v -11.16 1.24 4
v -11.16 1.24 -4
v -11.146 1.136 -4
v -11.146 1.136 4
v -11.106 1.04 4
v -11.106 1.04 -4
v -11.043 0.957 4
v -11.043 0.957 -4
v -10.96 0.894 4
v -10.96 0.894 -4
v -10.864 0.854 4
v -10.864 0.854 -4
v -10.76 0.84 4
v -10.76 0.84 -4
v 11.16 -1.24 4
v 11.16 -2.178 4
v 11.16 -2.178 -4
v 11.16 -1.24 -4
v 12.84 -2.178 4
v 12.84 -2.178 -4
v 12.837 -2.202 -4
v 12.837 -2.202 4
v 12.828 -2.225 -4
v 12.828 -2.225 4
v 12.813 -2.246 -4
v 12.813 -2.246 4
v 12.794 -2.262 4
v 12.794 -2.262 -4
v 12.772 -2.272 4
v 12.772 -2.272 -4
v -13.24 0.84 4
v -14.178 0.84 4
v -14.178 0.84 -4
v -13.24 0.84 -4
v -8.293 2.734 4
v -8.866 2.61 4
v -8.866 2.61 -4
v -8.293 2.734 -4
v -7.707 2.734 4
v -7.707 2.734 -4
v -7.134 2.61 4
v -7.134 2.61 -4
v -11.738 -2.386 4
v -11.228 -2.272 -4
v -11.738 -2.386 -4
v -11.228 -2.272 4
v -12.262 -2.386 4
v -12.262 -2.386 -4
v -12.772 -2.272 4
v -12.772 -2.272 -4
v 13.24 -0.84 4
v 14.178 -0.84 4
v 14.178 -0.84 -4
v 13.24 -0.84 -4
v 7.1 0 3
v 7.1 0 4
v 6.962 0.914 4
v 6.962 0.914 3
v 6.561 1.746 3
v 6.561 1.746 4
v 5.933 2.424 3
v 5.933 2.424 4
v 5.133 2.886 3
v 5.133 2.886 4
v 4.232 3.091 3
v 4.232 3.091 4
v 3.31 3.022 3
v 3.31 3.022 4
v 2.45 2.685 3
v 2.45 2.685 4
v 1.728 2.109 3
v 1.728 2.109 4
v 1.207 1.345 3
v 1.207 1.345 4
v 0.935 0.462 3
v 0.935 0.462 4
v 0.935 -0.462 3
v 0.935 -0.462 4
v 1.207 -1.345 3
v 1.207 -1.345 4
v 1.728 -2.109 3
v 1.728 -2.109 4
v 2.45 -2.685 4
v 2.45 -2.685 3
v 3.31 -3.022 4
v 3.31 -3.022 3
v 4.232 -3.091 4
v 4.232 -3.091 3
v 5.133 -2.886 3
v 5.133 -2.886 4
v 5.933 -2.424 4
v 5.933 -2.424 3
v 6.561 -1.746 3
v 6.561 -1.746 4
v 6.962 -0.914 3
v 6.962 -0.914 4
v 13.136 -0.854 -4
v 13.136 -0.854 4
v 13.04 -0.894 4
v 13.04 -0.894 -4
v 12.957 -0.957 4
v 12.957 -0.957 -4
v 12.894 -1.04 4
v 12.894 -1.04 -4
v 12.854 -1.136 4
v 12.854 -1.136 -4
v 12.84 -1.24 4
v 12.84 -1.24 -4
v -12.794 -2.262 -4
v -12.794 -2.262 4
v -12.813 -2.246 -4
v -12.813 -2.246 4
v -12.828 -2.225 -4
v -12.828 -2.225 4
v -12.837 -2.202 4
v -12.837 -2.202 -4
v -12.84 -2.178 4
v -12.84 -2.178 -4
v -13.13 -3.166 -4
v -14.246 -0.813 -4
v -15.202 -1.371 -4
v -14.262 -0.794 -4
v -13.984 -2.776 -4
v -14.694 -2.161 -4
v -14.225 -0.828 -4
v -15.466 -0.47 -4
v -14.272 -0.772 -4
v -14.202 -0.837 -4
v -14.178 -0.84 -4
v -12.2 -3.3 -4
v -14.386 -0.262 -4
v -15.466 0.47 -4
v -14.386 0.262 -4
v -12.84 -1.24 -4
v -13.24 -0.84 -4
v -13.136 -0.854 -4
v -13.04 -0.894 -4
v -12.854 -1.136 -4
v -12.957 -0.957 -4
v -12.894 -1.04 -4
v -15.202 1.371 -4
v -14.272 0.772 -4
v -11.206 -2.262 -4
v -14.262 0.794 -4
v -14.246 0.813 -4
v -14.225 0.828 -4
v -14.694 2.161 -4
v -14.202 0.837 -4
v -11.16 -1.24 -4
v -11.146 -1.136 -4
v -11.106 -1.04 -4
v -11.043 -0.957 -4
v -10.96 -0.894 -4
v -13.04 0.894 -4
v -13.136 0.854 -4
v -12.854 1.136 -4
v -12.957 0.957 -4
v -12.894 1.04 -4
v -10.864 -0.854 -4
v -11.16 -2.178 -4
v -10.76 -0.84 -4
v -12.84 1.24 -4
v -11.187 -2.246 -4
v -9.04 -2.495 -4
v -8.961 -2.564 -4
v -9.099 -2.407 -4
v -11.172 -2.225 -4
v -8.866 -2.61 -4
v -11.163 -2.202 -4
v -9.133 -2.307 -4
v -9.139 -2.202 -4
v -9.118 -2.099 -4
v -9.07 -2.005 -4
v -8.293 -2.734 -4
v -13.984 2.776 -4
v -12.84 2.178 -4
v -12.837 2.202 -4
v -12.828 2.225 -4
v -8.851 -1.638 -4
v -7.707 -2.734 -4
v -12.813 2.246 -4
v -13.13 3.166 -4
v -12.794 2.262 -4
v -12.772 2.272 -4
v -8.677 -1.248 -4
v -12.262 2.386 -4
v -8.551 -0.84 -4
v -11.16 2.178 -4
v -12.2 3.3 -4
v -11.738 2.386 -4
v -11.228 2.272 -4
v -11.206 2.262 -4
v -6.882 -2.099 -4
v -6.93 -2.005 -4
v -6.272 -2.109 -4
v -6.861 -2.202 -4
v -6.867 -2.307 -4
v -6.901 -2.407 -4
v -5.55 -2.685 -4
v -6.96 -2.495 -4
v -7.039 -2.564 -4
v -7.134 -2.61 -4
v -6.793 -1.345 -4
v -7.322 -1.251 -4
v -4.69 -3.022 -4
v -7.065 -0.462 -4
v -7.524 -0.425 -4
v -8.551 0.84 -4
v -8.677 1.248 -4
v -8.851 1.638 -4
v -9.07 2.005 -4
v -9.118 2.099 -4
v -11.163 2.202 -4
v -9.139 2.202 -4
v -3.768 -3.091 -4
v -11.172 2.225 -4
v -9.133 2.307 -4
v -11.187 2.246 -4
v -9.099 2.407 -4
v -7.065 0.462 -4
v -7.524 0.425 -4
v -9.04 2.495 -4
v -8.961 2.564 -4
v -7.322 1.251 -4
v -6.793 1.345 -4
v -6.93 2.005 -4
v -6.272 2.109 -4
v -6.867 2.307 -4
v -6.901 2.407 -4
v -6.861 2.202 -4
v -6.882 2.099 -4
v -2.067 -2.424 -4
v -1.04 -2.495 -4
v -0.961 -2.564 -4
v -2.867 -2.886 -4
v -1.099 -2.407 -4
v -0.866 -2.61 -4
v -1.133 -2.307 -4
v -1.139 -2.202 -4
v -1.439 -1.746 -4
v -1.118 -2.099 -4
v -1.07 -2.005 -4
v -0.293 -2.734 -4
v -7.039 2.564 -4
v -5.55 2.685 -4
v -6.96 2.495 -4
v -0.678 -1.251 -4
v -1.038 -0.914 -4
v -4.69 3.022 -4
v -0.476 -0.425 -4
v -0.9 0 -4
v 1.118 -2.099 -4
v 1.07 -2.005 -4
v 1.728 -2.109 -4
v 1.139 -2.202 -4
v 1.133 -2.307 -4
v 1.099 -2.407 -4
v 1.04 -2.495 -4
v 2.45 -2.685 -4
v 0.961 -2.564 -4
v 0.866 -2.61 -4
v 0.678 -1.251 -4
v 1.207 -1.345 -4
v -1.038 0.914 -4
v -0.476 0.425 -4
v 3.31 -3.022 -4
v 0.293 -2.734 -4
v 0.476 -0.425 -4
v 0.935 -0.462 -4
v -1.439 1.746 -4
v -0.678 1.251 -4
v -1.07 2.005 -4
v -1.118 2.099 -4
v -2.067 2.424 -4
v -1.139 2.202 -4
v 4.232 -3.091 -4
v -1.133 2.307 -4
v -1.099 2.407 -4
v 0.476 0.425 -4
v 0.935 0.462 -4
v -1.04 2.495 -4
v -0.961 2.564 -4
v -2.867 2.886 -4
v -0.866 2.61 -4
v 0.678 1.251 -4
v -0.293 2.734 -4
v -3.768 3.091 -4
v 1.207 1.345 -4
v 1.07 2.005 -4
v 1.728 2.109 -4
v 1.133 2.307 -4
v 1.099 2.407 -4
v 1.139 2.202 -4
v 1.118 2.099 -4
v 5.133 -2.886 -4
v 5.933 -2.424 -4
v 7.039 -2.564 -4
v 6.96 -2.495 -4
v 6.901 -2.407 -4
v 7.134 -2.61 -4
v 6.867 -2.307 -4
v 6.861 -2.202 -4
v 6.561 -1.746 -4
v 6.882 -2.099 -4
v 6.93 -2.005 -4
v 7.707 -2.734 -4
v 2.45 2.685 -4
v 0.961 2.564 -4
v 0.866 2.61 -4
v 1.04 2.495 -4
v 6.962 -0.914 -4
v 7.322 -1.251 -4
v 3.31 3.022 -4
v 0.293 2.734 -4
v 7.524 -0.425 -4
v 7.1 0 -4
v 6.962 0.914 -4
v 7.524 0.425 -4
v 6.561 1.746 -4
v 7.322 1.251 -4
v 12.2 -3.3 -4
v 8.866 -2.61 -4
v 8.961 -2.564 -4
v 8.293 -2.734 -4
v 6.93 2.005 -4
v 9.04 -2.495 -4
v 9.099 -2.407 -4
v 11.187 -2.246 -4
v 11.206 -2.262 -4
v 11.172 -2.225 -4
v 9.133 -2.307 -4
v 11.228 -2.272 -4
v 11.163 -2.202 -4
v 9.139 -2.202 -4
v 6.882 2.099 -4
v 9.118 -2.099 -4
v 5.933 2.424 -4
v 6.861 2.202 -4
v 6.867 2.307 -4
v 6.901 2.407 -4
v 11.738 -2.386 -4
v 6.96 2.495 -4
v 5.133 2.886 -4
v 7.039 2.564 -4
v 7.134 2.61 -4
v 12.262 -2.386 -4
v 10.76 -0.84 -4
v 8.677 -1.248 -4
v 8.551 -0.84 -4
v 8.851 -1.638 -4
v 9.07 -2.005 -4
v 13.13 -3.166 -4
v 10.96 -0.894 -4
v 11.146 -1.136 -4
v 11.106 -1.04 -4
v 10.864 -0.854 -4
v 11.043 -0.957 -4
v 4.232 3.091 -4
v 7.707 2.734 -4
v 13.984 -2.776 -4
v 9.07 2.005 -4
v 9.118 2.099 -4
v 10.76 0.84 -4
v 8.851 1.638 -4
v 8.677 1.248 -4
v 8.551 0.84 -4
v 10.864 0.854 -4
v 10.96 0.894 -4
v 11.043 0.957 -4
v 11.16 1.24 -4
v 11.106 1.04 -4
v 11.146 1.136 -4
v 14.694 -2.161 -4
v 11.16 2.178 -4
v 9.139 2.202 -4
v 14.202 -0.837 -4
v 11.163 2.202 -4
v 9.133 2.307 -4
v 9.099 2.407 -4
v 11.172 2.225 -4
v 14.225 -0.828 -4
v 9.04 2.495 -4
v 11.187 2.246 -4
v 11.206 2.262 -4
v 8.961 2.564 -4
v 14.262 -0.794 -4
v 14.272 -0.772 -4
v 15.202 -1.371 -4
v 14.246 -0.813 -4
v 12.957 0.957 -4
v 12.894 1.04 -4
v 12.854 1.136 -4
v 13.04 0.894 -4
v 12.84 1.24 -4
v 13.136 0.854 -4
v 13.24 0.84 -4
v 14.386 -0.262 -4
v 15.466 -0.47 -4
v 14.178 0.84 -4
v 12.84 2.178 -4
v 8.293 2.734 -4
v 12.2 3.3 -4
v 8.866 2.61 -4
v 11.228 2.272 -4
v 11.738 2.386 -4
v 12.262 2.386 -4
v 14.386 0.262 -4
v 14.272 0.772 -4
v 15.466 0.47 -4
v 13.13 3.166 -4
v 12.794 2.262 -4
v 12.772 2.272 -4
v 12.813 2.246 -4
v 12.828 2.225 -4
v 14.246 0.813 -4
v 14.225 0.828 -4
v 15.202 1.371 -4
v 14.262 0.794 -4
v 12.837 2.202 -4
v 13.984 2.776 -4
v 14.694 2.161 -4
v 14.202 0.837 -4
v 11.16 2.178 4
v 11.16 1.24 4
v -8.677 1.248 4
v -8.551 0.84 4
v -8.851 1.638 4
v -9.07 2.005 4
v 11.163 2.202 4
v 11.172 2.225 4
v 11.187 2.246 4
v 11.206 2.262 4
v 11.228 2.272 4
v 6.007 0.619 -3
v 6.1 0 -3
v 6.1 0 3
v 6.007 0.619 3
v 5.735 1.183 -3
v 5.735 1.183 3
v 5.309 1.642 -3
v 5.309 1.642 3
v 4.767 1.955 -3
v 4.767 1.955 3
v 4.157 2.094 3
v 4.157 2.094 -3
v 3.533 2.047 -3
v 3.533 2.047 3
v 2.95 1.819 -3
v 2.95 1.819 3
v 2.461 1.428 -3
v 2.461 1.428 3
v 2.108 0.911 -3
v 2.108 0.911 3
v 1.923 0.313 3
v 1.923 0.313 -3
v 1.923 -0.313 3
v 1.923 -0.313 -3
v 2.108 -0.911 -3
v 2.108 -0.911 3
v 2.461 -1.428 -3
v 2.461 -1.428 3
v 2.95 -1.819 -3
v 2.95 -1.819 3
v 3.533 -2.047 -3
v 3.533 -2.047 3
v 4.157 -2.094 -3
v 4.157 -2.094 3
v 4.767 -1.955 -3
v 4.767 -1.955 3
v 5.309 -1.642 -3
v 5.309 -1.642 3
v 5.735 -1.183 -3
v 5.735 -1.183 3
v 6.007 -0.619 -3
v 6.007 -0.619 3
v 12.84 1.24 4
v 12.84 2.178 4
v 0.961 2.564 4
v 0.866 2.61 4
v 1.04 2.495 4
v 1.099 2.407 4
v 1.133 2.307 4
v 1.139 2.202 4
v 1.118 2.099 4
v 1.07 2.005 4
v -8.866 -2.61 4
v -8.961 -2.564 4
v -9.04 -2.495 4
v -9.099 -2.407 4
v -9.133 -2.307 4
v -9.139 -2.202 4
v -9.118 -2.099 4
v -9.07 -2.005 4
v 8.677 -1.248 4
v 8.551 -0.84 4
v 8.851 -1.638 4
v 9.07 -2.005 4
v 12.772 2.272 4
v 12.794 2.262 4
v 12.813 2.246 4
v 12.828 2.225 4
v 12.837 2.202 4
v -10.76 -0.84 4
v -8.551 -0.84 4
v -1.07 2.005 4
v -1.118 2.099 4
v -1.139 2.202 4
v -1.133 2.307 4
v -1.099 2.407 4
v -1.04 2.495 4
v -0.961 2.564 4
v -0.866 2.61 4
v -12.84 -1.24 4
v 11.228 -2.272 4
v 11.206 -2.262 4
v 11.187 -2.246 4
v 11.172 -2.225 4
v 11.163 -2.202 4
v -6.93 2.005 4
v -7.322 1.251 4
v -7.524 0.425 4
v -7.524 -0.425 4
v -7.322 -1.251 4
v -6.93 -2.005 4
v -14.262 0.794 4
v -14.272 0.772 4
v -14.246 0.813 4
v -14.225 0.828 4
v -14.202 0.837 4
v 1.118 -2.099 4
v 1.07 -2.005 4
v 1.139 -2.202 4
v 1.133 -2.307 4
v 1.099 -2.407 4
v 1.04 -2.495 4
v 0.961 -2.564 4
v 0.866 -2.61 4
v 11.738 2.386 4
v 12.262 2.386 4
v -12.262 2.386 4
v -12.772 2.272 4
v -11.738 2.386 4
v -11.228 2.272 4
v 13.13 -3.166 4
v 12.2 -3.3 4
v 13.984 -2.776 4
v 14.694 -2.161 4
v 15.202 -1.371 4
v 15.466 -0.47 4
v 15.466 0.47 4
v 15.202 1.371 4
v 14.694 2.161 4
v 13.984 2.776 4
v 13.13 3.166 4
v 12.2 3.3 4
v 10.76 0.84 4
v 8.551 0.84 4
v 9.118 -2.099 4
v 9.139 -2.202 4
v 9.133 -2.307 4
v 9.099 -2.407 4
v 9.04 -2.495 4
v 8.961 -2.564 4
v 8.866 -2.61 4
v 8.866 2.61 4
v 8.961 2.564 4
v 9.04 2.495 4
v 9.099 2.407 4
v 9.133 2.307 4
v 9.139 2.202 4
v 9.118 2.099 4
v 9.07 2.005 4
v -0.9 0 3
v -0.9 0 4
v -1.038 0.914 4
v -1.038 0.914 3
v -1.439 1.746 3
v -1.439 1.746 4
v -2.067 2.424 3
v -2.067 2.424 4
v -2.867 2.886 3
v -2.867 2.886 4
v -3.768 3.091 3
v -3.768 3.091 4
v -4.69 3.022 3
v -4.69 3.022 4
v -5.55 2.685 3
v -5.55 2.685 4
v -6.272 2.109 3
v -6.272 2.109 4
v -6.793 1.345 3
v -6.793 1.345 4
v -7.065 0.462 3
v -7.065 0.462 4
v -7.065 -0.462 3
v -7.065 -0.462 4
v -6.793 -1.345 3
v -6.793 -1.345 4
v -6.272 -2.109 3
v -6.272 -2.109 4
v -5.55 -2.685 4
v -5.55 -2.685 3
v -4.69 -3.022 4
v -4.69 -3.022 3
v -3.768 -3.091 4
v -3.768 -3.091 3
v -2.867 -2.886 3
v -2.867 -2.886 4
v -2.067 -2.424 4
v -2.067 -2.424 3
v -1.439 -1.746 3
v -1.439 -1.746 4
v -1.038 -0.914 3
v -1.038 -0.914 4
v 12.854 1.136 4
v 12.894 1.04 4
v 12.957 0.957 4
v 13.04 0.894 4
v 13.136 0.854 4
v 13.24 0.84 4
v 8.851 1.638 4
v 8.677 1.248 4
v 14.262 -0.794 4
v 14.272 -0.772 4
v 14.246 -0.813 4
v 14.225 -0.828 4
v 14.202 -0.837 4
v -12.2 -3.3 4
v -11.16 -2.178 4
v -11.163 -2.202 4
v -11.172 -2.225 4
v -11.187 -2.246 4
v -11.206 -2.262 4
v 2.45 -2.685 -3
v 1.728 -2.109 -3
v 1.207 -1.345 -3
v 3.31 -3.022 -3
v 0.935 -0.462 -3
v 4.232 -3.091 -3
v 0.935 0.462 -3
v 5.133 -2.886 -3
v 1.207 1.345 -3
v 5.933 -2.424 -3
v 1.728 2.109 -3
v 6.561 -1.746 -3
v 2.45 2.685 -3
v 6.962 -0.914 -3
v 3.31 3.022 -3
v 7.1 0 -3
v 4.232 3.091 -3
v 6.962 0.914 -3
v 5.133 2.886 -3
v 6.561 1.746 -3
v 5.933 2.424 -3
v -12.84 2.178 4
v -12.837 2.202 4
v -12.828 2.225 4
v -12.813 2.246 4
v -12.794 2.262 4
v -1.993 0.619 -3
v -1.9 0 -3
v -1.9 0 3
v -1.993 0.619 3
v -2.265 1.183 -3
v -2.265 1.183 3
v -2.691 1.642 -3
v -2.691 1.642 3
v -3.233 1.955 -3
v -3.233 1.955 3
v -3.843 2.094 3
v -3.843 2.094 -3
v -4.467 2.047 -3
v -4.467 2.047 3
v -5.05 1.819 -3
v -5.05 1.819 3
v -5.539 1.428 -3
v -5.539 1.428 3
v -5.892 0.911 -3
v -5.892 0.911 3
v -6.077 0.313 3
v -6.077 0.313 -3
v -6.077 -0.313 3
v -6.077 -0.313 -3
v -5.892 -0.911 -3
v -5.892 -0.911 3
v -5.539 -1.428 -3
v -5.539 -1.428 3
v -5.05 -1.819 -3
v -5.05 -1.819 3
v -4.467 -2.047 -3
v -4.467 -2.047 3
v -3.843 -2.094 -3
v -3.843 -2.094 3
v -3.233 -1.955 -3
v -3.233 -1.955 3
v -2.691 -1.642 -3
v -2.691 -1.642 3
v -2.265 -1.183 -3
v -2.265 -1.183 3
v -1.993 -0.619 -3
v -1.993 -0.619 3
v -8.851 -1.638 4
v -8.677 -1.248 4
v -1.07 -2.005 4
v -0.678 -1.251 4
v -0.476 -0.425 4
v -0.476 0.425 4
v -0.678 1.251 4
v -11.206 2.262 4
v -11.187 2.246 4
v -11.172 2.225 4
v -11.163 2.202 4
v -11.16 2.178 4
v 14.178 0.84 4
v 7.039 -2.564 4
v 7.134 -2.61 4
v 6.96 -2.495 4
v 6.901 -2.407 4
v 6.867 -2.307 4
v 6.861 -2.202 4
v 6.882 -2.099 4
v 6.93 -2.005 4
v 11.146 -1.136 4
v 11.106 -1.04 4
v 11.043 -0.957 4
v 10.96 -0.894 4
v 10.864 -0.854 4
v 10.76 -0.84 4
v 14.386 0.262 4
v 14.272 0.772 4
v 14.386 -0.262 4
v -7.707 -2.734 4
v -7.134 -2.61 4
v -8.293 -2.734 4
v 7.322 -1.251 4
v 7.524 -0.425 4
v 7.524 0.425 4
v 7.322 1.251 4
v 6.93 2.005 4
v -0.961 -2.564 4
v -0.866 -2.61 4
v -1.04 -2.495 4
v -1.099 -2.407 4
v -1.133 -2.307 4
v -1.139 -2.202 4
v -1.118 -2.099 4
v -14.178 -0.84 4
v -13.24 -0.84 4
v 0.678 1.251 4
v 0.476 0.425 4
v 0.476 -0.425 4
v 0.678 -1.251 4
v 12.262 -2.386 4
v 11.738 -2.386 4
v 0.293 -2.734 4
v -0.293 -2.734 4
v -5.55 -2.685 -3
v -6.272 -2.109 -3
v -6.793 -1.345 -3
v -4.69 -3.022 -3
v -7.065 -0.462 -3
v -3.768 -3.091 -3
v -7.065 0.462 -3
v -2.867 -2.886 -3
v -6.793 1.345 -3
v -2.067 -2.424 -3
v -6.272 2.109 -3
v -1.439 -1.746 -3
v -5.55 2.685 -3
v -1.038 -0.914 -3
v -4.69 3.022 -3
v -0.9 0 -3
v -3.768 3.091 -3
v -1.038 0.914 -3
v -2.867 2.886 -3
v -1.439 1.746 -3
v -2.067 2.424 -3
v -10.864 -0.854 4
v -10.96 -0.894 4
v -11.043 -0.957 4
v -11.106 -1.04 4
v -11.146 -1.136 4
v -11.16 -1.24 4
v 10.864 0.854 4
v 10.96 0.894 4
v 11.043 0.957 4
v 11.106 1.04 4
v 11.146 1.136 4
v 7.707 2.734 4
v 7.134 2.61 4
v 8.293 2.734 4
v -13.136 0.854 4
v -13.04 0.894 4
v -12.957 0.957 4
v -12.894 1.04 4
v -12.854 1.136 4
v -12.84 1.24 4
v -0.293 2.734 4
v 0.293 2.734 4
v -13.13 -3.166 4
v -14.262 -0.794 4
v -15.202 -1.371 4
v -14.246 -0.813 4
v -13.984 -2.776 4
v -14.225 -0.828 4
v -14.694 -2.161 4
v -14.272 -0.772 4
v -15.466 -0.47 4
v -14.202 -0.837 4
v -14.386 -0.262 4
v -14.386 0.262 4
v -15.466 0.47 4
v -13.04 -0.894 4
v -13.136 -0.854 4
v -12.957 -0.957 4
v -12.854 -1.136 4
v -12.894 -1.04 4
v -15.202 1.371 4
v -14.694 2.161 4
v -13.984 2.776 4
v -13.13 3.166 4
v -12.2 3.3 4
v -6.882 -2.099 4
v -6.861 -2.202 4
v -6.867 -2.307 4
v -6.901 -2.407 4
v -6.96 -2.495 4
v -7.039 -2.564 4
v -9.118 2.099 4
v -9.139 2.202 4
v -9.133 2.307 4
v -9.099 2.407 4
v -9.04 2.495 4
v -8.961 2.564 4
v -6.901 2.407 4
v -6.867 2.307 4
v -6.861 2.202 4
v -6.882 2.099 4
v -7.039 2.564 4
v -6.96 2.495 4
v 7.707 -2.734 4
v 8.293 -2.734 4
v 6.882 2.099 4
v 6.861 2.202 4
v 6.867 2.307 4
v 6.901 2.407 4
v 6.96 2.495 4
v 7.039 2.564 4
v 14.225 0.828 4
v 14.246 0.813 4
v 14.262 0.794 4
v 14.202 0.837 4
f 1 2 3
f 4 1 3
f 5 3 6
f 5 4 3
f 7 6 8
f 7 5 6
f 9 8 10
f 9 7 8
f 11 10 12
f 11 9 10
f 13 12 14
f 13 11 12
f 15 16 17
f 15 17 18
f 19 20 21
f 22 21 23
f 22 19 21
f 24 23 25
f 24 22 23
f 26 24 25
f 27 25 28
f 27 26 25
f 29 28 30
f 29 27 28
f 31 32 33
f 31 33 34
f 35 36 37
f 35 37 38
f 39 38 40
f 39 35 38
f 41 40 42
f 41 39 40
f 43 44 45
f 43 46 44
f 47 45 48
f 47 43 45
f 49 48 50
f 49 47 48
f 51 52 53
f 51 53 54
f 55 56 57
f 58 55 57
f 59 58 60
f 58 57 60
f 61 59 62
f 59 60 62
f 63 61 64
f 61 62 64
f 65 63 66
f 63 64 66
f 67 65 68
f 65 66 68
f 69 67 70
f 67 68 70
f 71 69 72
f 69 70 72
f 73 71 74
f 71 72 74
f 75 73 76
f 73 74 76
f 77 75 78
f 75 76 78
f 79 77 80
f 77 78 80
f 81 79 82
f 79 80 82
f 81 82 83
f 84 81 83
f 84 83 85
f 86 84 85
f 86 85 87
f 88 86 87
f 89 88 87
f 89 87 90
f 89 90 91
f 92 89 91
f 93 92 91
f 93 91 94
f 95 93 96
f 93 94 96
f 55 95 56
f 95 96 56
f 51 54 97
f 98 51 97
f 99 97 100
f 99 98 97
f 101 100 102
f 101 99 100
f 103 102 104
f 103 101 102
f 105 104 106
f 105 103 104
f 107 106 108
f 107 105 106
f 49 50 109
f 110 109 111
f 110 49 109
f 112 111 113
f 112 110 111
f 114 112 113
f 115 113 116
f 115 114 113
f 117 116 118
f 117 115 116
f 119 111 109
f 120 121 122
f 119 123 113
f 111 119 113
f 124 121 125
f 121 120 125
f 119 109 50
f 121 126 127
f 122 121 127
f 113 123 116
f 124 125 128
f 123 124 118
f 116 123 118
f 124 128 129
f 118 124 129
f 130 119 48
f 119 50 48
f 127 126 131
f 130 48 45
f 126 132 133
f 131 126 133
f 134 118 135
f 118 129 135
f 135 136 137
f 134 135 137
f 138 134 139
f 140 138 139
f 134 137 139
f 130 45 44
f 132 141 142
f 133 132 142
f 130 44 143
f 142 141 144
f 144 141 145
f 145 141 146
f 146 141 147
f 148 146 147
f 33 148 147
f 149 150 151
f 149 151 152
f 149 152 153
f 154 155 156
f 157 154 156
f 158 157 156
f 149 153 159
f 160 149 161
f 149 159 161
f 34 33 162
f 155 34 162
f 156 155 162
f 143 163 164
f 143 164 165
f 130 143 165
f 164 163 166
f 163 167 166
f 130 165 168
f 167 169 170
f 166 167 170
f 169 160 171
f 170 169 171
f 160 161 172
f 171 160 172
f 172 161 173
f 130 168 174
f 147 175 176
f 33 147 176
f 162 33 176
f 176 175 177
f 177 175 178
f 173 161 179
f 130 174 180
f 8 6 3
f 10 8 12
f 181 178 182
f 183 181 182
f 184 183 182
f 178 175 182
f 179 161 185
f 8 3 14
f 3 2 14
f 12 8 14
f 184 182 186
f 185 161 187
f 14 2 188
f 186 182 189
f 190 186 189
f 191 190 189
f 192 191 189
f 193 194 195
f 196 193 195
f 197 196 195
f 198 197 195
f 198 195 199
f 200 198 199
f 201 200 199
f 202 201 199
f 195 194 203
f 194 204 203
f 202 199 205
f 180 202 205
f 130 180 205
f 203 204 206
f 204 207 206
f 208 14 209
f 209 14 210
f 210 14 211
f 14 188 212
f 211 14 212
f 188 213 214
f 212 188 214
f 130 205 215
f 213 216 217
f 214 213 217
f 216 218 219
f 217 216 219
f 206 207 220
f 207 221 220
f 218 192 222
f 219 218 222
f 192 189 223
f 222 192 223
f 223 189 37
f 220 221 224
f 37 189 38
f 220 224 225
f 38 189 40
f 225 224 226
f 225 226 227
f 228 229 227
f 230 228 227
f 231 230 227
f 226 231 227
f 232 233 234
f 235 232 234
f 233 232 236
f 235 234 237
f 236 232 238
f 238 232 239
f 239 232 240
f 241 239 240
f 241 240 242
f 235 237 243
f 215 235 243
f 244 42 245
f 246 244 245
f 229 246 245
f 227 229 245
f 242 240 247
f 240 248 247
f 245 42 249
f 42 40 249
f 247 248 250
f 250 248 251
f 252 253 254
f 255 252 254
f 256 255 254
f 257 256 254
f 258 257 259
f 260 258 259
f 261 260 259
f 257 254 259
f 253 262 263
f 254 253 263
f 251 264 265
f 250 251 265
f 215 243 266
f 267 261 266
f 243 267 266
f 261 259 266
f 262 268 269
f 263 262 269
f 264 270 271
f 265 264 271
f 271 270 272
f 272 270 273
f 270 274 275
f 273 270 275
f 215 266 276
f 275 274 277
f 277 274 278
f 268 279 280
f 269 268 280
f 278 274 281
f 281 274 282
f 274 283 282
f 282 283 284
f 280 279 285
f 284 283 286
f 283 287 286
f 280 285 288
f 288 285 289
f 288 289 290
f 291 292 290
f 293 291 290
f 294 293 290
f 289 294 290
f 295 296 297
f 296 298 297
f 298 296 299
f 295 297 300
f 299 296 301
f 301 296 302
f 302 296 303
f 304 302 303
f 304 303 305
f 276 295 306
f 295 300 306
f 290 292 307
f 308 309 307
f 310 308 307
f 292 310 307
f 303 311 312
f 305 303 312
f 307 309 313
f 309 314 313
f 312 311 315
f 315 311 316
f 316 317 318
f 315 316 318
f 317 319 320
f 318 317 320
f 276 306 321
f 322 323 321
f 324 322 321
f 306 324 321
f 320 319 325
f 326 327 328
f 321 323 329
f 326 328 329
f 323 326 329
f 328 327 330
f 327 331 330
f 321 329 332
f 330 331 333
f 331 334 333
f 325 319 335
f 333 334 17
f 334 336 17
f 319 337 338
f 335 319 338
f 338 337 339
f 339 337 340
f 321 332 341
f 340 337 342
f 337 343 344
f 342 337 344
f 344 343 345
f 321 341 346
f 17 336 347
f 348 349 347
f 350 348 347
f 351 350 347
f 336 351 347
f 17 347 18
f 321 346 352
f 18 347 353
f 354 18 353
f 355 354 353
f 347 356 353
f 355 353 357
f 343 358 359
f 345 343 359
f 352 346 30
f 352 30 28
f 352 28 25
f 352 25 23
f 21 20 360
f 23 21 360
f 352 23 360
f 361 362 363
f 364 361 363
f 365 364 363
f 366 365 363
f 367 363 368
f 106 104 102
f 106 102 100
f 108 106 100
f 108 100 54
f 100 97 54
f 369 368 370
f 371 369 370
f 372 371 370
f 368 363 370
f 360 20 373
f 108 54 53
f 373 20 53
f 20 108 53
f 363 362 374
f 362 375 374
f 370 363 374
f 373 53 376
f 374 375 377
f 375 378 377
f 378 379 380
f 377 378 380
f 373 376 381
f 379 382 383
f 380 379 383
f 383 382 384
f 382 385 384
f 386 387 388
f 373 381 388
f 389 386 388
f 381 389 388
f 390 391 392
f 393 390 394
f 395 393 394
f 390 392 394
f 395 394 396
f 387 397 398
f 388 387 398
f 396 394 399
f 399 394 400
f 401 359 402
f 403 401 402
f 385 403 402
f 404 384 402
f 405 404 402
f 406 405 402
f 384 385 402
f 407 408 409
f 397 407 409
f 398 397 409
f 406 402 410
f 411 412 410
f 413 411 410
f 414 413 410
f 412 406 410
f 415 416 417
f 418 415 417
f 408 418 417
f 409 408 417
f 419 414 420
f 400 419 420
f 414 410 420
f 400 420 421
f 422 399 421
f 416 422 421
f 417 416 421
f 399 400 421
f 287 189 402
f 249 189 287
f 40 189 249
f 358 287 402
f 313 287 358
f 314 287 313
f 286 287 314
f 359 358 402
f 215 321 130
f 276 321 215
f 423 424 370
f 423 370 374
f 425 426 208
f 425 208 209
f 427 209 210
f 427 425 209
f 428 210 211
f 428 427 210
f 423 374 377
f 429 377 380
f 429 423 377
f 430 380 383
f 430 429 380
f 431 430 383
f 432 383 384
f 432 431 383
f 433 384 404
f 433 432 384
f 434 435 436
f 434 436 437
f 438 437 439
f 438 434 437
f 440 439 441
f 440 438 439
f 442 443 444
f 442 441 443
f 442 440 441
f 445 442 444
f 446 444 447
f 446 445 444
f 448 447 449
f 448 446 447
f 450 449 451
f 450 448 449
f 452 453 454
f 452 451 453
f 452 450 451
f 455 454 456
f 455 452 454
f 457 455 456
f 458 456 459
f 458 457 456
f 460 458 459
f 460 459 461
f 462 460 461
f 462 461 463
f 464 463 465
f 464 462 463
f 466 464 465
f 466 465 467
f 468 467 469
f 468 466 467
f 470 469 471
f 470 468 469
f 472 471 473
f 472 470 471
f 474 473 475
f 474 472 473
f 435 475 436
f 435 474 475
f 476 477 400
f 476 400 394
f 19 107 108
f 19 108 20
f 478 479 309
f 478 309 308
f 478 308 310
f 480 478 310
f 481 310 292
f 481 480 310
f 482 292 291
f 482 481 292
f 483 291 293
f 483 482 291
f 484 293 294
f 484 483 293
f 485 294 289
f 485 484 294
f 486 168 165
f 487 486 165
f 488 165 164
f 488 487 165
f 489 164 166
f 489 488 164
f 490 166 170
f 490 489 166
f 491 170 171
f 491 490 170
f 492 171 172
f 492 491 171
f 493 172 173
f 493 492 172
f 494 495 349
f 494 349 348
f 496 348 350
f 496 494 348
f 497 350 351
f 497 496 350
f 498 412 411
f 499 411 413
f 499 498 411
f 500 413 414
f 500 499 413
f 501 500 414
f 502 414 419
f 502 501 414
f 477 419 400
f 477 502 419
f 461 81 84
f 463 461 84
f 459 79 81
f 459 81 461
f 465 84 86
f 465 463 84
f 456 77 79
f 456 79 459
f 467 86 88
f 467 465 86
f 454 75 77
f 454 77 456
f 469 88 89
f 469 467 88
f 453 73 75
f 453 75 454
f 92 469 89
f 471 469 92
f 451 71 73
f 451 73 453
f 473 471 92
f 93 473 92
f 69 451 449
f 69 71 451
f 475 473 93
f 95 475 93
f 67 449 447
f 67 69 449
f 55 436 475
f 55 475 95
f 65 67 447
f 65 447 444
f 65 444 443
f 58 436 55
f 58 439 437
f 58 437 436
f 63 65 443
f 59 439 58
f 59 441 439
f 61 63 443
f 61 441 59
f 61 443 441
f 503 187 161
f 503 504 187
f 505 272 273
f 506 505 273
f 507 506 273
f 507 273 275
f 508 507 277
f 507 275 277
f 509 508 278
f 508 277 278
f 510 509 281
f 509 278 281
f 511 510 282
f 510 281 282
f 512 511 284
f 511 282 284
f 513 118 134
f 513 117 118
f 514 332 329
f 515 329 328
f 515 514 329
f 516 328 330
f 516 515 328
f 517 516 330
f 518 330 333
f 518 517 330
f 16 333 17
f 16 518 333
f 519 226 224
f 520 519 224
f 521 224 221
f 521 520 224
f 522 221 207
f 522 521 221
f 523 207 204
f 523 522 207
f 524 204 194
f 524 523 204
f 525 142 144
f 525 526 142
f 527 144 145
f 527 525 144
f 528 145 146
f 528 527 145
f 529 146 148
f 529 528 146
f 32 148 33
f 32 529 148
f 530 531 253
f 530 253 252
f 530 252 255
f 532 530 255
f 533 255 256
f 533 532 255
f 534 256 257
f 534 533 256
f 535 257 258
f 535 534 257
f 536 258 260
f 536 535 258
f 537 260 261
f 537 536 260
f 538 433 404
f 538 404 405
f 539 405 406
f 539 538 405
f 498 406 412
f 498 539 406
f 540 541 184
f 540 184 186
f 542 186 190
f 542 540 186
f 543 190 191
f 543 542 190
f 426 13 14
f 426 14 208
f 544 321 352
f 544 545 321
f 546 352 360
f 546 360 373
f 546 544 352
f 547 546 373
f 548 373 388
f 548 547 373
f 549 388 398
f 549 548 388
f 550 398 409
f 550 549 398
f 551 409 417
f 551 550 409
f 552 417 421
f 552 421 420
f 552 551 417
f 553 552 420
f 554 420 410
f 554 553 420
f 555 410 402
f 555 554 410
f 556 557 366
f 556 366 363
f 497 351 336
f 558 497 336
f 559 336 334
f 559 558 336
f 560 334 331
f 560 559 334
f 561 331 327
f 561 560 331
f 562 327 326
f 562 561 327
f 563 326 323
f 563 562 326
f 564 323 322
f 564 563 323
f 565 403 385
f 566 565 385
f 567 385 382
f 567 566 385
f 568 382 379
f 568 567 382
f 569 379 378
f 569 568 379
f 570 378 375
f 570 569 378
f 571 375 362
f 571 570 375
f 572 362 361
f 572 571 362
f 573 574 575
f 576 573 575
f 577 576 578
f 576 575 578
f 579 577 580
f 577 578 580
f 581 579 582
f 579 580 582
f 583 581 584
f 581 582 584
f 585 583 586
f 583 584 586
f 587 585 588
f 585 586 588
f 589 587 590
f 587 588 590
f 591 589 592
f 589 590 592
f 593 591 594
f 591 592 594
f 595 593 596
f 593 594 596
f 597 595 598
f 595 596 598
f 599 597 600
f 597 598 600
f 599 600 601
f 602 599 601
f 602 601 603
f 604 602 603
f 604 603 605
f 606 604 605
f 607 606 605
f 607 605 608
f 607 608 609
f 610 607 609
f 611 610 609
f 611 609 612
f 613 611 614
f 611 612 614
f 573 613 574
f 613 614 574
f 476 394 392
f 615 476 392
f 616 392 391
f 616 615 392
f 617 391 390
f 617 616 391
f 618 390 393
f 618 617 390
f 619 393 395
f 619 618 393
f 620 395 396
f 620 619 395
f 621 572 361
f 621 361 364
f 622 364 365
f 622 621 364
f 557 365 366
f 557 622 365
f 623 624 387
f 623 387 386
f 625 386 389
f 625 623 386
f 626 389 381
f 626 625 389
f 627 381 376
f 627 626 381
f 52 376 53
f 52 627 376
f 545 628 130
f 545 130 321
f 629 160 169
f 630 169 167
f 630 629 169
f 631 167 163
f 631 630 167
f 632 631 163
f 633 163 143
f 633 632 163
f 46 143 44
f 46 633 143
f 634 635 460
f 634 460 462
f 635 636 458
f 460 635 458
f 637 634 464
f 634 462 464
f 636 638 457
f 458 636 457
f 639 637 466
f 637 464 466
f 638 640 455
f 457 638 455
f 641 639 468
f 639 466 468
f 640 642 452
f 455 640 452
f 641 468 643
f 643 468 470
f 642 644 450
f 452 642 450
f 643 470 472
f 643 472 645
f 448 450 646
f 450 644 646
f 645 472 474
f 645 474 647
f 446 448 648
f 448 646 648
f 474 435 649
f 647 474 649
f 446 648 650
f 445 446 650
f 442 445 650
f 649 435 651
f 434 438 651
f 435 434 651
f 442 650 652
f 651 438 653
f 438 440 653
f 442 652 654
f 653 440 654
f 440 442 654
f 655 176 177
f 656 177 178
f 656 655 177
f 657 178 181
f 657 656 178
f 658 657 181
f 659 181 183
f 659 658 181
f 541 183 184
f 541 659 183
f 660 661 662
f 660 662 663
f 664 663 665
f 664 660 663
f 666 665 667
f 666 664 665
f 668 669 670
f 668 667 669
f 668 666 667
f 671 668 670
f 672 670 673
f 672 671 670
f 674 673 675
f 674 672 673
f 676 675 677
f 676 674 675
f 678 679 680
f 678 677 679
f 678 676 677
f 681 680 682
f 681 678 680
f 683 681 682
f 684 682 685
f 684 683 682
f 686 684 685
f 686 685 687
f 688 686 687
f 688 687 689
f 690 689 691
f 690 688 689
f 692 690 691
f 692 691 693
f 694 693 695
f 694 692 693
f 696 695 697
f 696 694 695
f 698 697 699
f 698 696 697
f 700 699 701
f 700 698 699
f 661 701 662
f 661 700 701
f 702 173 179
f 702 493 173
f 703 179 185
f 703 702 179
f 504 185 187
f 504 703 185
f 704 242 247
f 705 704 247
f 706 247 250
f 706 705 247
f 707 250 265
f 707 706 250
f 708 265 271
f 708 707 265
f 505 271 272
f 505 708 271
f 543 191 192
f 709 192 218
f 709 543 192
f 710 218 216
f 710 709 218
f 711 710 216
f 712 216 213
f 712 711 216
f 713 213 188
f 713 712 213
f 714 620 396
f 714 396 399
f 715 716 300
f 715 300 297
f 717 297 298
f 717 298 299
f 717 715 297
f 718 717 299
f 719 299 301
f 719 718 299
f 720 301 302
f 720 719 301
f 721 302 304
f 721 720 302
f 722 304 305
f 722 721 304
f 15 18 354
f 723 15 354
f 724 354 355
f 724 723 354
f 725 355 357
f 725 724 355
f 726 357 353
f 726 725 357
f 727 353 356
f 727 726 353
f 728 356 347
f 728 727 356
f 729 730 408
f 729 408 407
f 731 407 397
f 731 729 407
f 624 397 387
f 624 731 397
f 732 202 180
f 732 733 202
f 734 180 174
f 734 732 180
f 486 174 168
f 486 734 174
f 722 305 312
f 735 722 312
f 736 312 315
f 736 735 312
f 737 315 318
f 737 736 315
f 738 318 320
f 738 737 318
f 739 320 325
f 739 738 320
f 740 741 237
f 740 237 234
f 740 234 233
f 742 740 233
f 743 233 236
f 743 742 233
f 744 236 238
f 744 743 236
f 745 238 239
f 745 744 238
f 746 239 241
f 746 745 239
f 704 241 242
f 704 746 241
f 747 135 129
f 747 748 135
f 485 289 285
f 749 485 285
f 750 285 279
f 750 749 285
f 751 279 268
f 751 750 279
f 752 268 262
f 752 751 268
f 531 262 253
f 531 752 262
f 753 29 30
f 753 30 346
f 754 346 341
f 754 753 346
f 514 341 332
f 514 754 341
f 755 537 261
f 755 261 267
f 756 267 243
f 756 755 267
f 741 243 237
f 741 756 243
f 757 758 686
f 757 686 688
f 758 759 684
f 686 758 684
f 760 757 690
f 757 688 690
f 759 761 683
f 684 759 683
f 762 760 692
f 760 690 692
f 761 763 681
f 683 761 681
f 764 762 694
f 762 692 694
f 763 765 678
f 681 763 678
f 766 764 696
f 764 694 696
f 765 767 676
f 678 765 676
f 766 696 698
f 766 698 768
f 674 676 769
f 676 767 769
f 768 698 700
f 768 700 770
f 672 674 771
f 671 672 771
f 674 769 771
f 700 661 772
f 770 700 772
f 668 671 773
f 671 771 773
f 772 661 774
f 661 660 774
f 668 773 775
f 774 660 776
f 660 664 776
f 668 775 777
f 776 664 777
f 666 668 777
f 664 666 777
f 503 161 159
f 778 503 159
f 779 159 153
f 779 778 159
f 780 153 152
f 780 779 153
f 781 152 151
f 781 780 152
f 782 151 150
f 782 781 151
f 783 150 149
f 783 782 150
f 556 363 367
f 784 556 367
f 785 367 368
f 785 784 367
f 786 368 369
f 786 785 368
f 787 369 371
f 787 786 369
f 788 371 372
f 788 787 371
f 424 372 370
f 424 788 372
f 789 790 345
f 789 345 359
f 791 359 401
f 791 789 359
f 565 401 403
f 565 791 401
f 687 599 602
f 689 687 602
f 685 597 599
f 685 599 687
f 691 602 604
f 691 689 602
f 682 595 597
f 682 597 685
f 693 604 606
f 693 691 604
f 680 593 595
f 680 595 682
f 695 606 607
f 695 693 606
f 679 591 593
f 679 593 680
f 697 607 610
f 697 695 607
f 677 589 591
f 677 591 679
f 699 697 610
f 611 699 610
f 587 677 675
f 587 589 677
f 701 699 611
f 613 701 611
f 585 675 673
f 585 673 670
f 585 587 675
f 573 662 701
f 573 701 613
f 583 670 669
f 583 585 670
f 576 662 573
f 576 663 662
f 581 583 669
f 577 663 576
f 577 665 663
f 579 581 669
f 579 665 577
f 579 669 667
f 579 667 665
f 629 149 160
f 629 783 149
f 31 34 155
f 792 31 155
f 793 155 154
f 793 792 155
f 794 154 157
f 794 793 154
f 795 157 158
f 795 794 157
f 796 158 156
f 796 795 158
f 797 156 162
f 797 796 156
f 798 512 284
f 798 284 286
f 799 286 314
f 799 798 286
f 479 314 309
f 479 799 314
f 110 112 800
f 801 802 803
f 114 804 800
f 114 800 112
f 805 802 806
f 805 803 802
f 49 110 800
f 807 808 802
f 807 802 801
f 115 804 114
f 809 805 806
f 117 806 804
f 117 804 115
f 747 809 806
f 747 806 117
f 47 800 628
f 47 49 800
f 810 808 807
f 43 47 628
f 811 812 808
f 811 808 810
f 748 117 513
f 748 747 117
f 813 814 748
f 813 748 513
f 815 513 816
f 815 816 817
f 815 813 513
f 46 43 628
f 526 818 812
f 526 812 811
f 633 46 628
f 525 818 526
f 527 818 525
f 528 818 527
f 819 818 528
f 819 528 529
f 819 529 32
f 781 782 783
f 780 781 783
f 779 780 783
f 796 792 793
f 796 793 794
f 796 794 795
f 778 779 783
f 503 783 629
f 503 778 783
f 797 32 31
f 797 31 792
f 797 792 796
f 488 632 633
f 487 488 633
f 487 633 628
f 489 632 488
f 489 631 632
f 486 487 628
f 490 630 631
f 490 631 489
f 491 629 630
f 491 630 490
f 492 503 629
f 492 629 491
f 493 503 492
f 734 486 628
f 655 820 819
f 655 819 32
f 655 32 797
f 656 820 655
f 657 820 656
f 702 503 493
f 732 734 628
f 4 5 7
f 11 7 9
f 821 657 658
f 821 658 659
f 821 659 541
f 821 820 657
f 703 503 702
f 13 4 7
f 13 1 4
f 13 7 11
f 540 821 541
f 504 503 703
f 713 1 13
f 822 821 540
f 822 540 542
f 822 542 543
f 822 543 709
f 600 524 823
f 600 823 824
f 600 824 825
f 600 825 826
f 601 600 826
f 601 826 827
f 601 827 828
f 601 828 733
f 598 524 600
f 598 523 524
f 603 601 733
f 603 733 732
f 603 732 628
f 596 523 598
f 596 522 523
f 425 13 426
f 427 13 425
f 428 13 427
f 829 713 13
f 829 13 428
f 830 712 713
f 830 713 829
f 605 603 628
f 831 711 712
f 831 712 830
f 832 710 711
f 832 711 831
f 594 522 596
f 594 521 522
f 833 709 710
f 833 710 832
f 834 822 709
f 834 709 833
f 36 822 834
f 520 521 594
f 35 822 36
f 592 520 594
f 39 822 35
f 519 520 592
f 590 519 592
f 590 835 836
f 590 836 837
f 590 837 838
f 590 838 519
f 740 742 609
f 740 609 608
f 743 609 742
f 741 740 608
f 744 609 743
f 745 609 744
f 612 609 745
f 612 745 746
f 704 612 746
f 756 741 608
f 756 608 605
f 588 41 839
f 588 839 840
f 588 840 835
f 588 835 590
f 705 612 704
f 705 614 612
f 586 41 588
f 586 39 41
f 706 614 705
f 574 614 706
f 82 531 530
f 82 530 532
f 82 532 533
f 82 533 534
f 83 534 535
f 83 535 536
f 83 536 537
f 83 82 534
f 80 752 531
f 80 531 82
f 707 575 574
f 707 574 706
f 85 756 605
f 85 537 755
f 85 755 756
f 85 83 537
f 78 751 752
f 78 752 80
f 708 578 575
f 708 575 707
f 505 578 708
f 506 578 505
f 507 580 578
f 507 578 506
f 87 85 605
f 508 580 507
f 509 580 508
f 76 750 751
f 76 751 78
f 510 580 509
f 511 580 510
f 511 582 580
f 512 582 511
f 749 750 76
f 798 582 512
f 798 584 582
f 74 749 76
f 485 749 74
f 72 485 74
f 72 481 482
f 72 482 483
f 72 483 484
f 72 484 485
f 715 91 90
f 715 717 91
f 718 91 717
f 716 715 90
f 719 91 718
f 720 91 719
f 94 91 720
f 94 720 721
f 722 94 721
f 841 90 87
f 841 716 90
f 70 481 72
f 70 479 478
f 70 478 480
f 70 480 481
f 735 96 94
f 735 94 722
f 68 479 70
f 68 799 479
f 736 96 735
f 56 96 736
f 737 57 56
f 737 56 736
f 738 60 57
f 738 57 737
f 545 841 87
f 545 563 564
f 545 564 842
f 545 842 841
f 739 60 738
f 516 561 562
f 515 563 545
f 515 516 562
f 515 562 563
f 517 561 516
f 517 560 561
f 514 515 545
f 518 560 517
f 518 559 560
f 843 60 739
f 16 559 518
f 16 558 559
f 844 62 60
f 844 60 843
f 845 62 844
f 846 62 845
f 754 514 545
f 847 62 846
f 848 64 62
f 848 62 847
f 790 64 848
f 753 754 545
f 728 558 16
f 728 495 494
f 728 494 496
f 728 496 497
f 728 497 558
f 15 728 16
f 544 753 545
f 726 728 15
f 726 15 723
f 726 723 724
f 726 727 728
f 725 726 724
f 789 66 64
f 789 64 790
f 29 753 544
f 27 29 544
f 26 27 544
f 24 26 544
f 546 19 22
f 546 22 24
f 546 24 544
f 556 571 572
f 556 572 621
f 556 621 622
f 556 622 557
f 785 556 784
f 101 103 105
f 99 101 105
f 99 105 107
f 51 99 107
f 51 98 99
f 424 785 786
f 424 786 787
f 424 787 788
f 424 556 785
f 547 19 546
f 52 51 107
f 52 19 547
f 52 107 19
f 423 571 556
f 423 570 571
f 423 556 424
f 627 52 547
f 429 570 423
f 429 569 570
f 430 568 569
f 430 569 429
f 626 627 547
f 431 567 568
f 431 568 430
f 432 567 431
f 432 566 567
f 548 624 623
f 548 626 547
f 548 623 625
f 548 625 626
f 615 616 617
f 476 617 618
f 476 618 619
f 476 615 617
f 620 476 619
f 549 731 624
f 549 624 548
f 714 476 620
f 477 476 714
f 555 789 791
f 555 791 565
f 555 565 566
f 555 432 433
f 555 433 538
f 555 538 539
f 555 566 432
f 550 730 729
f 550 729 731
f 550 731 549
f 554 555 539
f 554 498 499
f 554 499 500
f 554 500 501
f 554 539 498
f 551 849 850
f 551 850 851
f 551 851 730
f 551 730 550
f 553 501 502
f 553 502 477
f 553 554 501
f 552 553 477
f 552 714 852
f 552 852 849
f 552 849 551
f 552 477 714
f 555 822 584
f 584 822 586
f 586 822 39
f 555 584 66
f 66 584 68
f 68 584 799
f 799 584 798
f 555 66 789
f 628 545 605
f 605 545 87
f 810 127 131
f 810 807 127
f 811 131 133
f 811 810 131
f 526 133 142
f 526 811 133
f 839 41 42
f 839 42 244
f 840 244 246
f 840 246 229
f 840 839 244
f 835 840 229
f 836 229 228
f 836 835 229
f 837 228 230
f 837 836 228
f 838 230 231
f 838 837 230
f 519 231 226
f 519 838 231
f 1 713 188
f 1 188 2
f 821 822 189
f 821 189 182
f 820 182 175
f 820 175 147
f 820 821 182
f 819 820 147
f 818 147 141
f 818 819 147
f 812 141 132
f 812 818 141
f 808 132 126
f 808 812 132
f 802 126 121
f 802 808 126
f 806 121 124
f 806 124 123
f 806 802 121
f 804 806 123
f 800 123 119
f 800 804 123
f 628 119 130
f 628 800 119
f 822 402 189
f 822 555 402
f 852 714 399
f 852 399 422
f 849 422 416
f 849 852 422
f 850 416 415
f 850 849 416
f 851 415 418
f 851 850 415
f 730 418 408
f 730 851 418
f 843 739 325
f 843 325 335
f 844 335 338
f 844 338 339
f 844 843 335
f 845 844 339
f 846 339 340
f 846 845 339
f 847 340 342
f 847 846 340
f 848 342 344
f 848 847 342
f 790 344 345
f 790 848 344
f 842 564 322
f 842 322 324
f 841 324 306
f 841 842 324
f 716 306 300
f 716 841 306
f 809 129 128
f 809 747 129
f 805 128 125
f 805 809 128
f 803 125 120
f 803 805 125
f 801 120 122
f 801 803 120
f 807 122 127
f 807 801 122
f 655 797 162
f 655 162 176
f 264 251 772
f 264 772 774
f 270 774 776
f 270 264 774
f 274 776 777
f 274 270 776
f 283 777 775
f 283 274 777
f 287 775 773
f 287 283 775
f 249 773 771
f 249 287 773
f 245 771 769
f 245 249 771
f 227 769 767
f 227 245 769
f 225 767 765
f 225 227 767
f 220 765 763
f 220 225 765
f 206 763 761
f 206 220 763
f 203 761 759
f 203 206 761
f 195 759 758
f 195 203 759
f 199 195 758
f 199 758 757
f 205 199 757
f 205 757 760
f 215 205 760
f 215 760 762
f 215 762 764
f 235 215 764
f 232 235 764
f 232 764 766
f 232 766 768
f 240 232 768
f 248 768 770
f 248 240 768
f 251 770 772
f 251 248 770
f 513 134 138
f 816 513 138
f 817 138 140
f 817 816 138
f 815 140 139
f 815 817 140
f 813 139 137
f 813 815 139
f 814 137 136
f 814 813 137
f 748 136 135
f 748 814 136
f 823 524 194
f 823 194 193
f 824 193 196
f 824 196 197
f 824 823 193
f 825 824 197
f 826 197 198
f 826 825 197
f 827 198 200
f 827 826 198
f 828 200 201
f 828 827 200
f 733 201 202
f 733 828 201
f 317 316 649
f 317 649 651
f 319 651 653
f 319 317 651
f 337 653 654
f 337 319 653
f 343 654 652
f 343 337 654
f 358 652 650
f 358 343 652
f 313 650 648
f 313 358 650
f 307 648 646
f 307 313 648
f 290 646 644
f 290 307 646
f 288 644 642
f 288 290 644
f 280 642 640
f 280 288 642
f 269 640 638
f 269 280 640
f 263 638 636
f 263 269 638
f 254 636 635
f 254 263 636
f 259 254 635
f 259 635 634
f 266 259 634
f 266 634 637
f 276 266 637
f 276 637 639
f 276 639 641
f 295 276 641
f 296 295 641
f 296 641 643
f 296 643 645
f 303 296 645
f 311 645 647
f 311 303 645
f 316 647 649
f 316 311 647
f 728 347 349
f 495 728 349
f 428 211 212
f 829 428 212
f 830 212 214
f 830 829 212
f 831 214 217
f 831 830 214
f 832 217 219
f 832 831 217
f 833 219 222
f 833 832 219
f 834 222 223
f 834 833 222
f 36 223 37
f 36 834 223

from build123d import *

# Parameters (mm, degrees)
SKETCH1_R           = 2.1
BOSS_EXTRUDE1_DEPTH = 4
SKETCH2_R           = 3.1
CUT_EXTRUDE1_DEPTH  = 1


with BuildPart() as part:
    # Sketch1 → Boss-Extrude1 (new, symmetric)
    with BuildSketch(Plane.XY):
        with BuildLine():
            Line((12.2, 3.3), (-12.2, 3.3))
            ThreePointArc((-12.2, 3.3), (-15.5, 0), (-12.2, -3.3))
            Line((-12.2, -3.3), (12.2, -3.3))
            ThreePointArc((12.2, -3.3), (15.5, 0), (12.2, 3.3))
        make_face()
        with BuildLine():
            Line((-14.177705214, 0.84), (-13.24, 0.84))
            ThreePointArc((-13.24, 0.84), (-12.957157288, 0.957157288), (-12.84, 1.24))
            Line((-12.84, 1.24), (-12.84, 2.177705214))
            ThreePointArc((-12.84, 2.177705214), (-12.821293884, 2.235940121), (-12.772173913, 2.27238805))
            ThreePointArc((-12.772173913, 2.27238805), (-12, 2.4), (-11.227826087, 2.27238805))
            ThreePointArc((-11.227826087, 2.27238805), (-11.178706116, 2.235940121), (-11.16, 2.177705214))
            Line((-11.16, 2.177705214), (-11.16, 1.24))
            ThreePointArc((-11.16, 1.24), (-11.042842712, 0.957157288), (-10.76, 0.84))
            Line((-10.76, 0.84), (-9.822294786, 0.84))
            Line((-9.822294786, 0.84), (-9.751800721, 0.84))
            Line((-9.751800721, 0.84), (-8.55081169, 0.84))
            ThreePointArc((-8.55081169, 0.84), (-8.757752494, 1.445797742), (-9.070126582, 2.004580194))
            ThreePointArc((-9.070126582, 2.004580194), (-9.119033599, 2.358251088), (-8.865957447, 2.610099174))
            ThreePointArc((-8.865957447, 2.610099174), (-8, 2.75), (-7.134042553, 2.610099174))
            ThreePointArc((-7.134042553, 2.610099174), (-6.880966401, 2.358251088), (-6.929873418, 2.004580194))
            ThreePointArc((-6.929873418, 2.004580194), (-7.55, 0), (-6.929873418, -2.004580194))
            ThreePointArc((-6.929873418, -2.004580194), (-6.880966401, -2.358251088), (-7.134042553, -2.610099174))
            ThreePointArc((-7.134042553, -2.610099174), (-8, -2.75), (-8.865957447, -2.610099174))
            ThreePointArc((-8.865957447, -2.610099174), (-9.119033599, -2.358251088), (-9.070126582, -2.004580194))
            ThreePointArc((-9.070126582, -2.004580194), (-8.757752494, -1.445797742), (-8.55081169, -0.84))
            Line((-8.55081169, -0.84), (-9.751800721, -0.84))
            Line((-9.751800721, -0.84), (-9.822294786, -0.84))
            Line((-9.822294786, -0.84), (-10.76, -0.84))
            ThreePointArc((-10.76, -0.84), (-11.042842712, -0.957157288), (-11.16, -1.24))
            Line((-11.16, -1.24), (-11.16, -2.177705214))
            ThreePointArc((-11.16, -2.177705214), (-11.178706116, -2.235940121), (-11.227826087, -2.27238805))
            ThreePointArc((-11.227826087, -2.27238805), (-12, -2.4), (-12.772173913, -2.27238805))
            ThreePointArc((-12.772173913, -2.27238805), (-12.821293884, -2.235940121), (-12.84, -2.177705214))
            Line((-12.84, -2.177705214), (-12.84, -1.24))
            ThreePointArc((-12.84, -1.24), (-12.957157288, -0.957157288), (-13.24, -0.84))
            Line((-13.24, -0.84), (-14.177705214, -0.84))
            ThreePointArc((-14.177705214, -0.84), (-14.235940121, -0.821293884), (-14.27238805, -0.772173913))
            ThreePointArc((-14.27238805, -0.772173913), (-14.4, 0), (-14.27238805, 0.772173913))
            ThreePointArc((-14.27238805, 0.772173913), (-14.235940121, 0.821293884), (-14.177705214, 0.84))
        make_face(mode=Mode.SUBTRACT)
        with BuildLine():
            ThreePointArc((0.865957447, -2.610099174), (0, -2.75), (-0.865957447, -2.610099174))
            ThreePointArc((-0.865957447, -2.610099174), (-1.119033599, -2.358251088), (-1.070126582, -2.004580194))
            ThreePointArc((-1.070126582, -2.004580194), (-0.45, 0), (-1.070126582, 2.004580194))
            ThreePointArc((-1.070126582, 2.004580194), (-1.119033599, 2.358251088), (-0.865957447, 2.610099174))
            ThreePointArc((-0.865957447, 2.610099174), (0, 2.75), (0.865957447, 2.610099174))
            ThreePointArc((0.865957447, 2.610099174), (1.119033599, 2.358251088), (1.070126582, 2.004580194))
            ThreePointArc((1.070126582, 2.004580194), (0.45, 0), (1.070126582, -2.004580194))
            ThreePointArc((1.070126582, -2.004580194), (1.119033599, -2.358251088), (0.865957447, -2.610099174))
        make_face(mode=Mode.SUBTRACT)
        with BuildLine():
            Line((12.84, 2.177705214), (12.84, 1.24))
            ThreePointArc((12.84, 1.24), (12.957157288, 0.957157288), (13.24, 0.84))
            Line((13.24, 0.84), (14.177705214, 0.84))
            ThreePointArc((14.177705214, 0.84), (14.235940121, 0.821293884), (14.27238805, 0.772173913))
            ThreePointArc((14.27238805, 0.772173913), (14.4, 0), (14.27238805, -0.772173913))
            ThreePointArc((14.27238805, -0.772173913), (14.235940121, -0.821293884), (14.177705214, -0.84))
            Line((14.177705214, -0.84), (13.24, -0.84))
            ThreePointArc((13.24, -0.84), (12.957157288, -0.957157288), (12.84, -1.24))
            Line((12.84, -1.24), (12.84, -2.177705214))
            ThreePointArc((12.84, -2.177705214), (12.821293884, -2.235940121), (12.772173913, -2.27238805))
            ThreePointArc((12.772173913, -2.27238805), (12, -2.4), (11.227826087, -2.27238805))
            ThreePointArc((11.227826087, -2.27238805), (11.178706116, -2.235940121), (11.16, -2.177705214))
            Line((11.16, -2.177705214), (11.16, -1.24))
            ThreePointArc((11.16, -1.24), (11.042842712, -0.957157288), (10.76, -0.84))
            Line((10.76, -0.84), (9.822294786, -0.84))
            Line((9.822294786, -0.84), (9.751800721, -0.84))
            Line((9.751800721, -0.84), (8.55081169, -0.84))
            ThreePointArc((8.55081169, -0.84), (8.757752494, -1.445797742), (9.070126582, -2.004580194))
            ThreePointArc((9.070126582, -2.004580194), (9.119033599, -2.358251088), (8.865957447, -2.610099174))
            ThreePointArc((8.865957447, -2.610099174), (8, -2.75), (7.134042553, -2.610099174))
            ThreePointArc((7.134042553, -2.610099174), (6.880966401, -2.358251088), (6.929873418, -2.004580194))
            ThreePointArc((6.929873418, -2.004580194), (7.55, 0), (6.929873418, 2.004580194))
            ThreePointArc((6.929873418, 2.004580194), (6.880966401, 2.358251088), (7.134042553, 2.610099174))
            ThreePointArc((7.134042553, 2.610099174), (8, 2.75), (8.865957447, 2.610099174))
            ThreePointArc((8.865957447, 2.610099174), (9.119033599, 2.358251088), (9.070126582, 2.004580194))
            ThreePointArc((9.070126582, 2.004580194), (8.757752494, 1.445797742), (8.55081169, 0.84))
            Line((8.55081169, 0.84), (9.751800721, 0.84))
            Line((9.751800721, 0.84), (9.822294786, 0.84))
            Line((9.822294786, 0.84), (10.76, 0.84))
            ThreePointArc((10.76, 0.84), (11.042842712, 0.957157288), (11.16, 1.24))
            Line((11.16, 1.24), (11.16, 2.177705214))
            ThreePointArc((11.16, 2.177705214), (11.178706116, 2.235940121), (11.227826087, 2.27238805))
            ThreePointArc((11.227826087, 2.27238805), (12, 2.4), (12.772173913, 2.27238805))
            ThreePointArc((12.772173913, 2.27238805), (12.821293884, 2.235940121), (12.84, 2.177705214))
        make_face(mode=Mode.SUBTRACT)
        with Locations((-4, 0)):
            Circle(SKETCH1_R, mode=Mode.SUBTRACT)
        with Locations((4, 0)):
            Circle(SKETCH1_R, mode=Mode.SUBTRACT)
    extrude(amount=BOSS_EXTRUDE1_DEPTH, both=True)

    # Sketch2 → Cut-Extrude1 (cut)
    with BuildSketch(Plane.XY.offset(4)):
        with Locations((-4, 0)):
            Circle(SKETCH2_R)
        with Locations((4, 0)):
            Circle(SKETCH2_R)
    cut_extrude1 = extrude(amount=-CUT_EXTRUDE1_DEPTH, mode=Mode.SUBTRACT)

    # Mirror1: Cut-Extrude1 across plane
    add(cut_extrude1.mirror(Plane.XY), mode=Mode.SUBTRACT)


solid = part.part
